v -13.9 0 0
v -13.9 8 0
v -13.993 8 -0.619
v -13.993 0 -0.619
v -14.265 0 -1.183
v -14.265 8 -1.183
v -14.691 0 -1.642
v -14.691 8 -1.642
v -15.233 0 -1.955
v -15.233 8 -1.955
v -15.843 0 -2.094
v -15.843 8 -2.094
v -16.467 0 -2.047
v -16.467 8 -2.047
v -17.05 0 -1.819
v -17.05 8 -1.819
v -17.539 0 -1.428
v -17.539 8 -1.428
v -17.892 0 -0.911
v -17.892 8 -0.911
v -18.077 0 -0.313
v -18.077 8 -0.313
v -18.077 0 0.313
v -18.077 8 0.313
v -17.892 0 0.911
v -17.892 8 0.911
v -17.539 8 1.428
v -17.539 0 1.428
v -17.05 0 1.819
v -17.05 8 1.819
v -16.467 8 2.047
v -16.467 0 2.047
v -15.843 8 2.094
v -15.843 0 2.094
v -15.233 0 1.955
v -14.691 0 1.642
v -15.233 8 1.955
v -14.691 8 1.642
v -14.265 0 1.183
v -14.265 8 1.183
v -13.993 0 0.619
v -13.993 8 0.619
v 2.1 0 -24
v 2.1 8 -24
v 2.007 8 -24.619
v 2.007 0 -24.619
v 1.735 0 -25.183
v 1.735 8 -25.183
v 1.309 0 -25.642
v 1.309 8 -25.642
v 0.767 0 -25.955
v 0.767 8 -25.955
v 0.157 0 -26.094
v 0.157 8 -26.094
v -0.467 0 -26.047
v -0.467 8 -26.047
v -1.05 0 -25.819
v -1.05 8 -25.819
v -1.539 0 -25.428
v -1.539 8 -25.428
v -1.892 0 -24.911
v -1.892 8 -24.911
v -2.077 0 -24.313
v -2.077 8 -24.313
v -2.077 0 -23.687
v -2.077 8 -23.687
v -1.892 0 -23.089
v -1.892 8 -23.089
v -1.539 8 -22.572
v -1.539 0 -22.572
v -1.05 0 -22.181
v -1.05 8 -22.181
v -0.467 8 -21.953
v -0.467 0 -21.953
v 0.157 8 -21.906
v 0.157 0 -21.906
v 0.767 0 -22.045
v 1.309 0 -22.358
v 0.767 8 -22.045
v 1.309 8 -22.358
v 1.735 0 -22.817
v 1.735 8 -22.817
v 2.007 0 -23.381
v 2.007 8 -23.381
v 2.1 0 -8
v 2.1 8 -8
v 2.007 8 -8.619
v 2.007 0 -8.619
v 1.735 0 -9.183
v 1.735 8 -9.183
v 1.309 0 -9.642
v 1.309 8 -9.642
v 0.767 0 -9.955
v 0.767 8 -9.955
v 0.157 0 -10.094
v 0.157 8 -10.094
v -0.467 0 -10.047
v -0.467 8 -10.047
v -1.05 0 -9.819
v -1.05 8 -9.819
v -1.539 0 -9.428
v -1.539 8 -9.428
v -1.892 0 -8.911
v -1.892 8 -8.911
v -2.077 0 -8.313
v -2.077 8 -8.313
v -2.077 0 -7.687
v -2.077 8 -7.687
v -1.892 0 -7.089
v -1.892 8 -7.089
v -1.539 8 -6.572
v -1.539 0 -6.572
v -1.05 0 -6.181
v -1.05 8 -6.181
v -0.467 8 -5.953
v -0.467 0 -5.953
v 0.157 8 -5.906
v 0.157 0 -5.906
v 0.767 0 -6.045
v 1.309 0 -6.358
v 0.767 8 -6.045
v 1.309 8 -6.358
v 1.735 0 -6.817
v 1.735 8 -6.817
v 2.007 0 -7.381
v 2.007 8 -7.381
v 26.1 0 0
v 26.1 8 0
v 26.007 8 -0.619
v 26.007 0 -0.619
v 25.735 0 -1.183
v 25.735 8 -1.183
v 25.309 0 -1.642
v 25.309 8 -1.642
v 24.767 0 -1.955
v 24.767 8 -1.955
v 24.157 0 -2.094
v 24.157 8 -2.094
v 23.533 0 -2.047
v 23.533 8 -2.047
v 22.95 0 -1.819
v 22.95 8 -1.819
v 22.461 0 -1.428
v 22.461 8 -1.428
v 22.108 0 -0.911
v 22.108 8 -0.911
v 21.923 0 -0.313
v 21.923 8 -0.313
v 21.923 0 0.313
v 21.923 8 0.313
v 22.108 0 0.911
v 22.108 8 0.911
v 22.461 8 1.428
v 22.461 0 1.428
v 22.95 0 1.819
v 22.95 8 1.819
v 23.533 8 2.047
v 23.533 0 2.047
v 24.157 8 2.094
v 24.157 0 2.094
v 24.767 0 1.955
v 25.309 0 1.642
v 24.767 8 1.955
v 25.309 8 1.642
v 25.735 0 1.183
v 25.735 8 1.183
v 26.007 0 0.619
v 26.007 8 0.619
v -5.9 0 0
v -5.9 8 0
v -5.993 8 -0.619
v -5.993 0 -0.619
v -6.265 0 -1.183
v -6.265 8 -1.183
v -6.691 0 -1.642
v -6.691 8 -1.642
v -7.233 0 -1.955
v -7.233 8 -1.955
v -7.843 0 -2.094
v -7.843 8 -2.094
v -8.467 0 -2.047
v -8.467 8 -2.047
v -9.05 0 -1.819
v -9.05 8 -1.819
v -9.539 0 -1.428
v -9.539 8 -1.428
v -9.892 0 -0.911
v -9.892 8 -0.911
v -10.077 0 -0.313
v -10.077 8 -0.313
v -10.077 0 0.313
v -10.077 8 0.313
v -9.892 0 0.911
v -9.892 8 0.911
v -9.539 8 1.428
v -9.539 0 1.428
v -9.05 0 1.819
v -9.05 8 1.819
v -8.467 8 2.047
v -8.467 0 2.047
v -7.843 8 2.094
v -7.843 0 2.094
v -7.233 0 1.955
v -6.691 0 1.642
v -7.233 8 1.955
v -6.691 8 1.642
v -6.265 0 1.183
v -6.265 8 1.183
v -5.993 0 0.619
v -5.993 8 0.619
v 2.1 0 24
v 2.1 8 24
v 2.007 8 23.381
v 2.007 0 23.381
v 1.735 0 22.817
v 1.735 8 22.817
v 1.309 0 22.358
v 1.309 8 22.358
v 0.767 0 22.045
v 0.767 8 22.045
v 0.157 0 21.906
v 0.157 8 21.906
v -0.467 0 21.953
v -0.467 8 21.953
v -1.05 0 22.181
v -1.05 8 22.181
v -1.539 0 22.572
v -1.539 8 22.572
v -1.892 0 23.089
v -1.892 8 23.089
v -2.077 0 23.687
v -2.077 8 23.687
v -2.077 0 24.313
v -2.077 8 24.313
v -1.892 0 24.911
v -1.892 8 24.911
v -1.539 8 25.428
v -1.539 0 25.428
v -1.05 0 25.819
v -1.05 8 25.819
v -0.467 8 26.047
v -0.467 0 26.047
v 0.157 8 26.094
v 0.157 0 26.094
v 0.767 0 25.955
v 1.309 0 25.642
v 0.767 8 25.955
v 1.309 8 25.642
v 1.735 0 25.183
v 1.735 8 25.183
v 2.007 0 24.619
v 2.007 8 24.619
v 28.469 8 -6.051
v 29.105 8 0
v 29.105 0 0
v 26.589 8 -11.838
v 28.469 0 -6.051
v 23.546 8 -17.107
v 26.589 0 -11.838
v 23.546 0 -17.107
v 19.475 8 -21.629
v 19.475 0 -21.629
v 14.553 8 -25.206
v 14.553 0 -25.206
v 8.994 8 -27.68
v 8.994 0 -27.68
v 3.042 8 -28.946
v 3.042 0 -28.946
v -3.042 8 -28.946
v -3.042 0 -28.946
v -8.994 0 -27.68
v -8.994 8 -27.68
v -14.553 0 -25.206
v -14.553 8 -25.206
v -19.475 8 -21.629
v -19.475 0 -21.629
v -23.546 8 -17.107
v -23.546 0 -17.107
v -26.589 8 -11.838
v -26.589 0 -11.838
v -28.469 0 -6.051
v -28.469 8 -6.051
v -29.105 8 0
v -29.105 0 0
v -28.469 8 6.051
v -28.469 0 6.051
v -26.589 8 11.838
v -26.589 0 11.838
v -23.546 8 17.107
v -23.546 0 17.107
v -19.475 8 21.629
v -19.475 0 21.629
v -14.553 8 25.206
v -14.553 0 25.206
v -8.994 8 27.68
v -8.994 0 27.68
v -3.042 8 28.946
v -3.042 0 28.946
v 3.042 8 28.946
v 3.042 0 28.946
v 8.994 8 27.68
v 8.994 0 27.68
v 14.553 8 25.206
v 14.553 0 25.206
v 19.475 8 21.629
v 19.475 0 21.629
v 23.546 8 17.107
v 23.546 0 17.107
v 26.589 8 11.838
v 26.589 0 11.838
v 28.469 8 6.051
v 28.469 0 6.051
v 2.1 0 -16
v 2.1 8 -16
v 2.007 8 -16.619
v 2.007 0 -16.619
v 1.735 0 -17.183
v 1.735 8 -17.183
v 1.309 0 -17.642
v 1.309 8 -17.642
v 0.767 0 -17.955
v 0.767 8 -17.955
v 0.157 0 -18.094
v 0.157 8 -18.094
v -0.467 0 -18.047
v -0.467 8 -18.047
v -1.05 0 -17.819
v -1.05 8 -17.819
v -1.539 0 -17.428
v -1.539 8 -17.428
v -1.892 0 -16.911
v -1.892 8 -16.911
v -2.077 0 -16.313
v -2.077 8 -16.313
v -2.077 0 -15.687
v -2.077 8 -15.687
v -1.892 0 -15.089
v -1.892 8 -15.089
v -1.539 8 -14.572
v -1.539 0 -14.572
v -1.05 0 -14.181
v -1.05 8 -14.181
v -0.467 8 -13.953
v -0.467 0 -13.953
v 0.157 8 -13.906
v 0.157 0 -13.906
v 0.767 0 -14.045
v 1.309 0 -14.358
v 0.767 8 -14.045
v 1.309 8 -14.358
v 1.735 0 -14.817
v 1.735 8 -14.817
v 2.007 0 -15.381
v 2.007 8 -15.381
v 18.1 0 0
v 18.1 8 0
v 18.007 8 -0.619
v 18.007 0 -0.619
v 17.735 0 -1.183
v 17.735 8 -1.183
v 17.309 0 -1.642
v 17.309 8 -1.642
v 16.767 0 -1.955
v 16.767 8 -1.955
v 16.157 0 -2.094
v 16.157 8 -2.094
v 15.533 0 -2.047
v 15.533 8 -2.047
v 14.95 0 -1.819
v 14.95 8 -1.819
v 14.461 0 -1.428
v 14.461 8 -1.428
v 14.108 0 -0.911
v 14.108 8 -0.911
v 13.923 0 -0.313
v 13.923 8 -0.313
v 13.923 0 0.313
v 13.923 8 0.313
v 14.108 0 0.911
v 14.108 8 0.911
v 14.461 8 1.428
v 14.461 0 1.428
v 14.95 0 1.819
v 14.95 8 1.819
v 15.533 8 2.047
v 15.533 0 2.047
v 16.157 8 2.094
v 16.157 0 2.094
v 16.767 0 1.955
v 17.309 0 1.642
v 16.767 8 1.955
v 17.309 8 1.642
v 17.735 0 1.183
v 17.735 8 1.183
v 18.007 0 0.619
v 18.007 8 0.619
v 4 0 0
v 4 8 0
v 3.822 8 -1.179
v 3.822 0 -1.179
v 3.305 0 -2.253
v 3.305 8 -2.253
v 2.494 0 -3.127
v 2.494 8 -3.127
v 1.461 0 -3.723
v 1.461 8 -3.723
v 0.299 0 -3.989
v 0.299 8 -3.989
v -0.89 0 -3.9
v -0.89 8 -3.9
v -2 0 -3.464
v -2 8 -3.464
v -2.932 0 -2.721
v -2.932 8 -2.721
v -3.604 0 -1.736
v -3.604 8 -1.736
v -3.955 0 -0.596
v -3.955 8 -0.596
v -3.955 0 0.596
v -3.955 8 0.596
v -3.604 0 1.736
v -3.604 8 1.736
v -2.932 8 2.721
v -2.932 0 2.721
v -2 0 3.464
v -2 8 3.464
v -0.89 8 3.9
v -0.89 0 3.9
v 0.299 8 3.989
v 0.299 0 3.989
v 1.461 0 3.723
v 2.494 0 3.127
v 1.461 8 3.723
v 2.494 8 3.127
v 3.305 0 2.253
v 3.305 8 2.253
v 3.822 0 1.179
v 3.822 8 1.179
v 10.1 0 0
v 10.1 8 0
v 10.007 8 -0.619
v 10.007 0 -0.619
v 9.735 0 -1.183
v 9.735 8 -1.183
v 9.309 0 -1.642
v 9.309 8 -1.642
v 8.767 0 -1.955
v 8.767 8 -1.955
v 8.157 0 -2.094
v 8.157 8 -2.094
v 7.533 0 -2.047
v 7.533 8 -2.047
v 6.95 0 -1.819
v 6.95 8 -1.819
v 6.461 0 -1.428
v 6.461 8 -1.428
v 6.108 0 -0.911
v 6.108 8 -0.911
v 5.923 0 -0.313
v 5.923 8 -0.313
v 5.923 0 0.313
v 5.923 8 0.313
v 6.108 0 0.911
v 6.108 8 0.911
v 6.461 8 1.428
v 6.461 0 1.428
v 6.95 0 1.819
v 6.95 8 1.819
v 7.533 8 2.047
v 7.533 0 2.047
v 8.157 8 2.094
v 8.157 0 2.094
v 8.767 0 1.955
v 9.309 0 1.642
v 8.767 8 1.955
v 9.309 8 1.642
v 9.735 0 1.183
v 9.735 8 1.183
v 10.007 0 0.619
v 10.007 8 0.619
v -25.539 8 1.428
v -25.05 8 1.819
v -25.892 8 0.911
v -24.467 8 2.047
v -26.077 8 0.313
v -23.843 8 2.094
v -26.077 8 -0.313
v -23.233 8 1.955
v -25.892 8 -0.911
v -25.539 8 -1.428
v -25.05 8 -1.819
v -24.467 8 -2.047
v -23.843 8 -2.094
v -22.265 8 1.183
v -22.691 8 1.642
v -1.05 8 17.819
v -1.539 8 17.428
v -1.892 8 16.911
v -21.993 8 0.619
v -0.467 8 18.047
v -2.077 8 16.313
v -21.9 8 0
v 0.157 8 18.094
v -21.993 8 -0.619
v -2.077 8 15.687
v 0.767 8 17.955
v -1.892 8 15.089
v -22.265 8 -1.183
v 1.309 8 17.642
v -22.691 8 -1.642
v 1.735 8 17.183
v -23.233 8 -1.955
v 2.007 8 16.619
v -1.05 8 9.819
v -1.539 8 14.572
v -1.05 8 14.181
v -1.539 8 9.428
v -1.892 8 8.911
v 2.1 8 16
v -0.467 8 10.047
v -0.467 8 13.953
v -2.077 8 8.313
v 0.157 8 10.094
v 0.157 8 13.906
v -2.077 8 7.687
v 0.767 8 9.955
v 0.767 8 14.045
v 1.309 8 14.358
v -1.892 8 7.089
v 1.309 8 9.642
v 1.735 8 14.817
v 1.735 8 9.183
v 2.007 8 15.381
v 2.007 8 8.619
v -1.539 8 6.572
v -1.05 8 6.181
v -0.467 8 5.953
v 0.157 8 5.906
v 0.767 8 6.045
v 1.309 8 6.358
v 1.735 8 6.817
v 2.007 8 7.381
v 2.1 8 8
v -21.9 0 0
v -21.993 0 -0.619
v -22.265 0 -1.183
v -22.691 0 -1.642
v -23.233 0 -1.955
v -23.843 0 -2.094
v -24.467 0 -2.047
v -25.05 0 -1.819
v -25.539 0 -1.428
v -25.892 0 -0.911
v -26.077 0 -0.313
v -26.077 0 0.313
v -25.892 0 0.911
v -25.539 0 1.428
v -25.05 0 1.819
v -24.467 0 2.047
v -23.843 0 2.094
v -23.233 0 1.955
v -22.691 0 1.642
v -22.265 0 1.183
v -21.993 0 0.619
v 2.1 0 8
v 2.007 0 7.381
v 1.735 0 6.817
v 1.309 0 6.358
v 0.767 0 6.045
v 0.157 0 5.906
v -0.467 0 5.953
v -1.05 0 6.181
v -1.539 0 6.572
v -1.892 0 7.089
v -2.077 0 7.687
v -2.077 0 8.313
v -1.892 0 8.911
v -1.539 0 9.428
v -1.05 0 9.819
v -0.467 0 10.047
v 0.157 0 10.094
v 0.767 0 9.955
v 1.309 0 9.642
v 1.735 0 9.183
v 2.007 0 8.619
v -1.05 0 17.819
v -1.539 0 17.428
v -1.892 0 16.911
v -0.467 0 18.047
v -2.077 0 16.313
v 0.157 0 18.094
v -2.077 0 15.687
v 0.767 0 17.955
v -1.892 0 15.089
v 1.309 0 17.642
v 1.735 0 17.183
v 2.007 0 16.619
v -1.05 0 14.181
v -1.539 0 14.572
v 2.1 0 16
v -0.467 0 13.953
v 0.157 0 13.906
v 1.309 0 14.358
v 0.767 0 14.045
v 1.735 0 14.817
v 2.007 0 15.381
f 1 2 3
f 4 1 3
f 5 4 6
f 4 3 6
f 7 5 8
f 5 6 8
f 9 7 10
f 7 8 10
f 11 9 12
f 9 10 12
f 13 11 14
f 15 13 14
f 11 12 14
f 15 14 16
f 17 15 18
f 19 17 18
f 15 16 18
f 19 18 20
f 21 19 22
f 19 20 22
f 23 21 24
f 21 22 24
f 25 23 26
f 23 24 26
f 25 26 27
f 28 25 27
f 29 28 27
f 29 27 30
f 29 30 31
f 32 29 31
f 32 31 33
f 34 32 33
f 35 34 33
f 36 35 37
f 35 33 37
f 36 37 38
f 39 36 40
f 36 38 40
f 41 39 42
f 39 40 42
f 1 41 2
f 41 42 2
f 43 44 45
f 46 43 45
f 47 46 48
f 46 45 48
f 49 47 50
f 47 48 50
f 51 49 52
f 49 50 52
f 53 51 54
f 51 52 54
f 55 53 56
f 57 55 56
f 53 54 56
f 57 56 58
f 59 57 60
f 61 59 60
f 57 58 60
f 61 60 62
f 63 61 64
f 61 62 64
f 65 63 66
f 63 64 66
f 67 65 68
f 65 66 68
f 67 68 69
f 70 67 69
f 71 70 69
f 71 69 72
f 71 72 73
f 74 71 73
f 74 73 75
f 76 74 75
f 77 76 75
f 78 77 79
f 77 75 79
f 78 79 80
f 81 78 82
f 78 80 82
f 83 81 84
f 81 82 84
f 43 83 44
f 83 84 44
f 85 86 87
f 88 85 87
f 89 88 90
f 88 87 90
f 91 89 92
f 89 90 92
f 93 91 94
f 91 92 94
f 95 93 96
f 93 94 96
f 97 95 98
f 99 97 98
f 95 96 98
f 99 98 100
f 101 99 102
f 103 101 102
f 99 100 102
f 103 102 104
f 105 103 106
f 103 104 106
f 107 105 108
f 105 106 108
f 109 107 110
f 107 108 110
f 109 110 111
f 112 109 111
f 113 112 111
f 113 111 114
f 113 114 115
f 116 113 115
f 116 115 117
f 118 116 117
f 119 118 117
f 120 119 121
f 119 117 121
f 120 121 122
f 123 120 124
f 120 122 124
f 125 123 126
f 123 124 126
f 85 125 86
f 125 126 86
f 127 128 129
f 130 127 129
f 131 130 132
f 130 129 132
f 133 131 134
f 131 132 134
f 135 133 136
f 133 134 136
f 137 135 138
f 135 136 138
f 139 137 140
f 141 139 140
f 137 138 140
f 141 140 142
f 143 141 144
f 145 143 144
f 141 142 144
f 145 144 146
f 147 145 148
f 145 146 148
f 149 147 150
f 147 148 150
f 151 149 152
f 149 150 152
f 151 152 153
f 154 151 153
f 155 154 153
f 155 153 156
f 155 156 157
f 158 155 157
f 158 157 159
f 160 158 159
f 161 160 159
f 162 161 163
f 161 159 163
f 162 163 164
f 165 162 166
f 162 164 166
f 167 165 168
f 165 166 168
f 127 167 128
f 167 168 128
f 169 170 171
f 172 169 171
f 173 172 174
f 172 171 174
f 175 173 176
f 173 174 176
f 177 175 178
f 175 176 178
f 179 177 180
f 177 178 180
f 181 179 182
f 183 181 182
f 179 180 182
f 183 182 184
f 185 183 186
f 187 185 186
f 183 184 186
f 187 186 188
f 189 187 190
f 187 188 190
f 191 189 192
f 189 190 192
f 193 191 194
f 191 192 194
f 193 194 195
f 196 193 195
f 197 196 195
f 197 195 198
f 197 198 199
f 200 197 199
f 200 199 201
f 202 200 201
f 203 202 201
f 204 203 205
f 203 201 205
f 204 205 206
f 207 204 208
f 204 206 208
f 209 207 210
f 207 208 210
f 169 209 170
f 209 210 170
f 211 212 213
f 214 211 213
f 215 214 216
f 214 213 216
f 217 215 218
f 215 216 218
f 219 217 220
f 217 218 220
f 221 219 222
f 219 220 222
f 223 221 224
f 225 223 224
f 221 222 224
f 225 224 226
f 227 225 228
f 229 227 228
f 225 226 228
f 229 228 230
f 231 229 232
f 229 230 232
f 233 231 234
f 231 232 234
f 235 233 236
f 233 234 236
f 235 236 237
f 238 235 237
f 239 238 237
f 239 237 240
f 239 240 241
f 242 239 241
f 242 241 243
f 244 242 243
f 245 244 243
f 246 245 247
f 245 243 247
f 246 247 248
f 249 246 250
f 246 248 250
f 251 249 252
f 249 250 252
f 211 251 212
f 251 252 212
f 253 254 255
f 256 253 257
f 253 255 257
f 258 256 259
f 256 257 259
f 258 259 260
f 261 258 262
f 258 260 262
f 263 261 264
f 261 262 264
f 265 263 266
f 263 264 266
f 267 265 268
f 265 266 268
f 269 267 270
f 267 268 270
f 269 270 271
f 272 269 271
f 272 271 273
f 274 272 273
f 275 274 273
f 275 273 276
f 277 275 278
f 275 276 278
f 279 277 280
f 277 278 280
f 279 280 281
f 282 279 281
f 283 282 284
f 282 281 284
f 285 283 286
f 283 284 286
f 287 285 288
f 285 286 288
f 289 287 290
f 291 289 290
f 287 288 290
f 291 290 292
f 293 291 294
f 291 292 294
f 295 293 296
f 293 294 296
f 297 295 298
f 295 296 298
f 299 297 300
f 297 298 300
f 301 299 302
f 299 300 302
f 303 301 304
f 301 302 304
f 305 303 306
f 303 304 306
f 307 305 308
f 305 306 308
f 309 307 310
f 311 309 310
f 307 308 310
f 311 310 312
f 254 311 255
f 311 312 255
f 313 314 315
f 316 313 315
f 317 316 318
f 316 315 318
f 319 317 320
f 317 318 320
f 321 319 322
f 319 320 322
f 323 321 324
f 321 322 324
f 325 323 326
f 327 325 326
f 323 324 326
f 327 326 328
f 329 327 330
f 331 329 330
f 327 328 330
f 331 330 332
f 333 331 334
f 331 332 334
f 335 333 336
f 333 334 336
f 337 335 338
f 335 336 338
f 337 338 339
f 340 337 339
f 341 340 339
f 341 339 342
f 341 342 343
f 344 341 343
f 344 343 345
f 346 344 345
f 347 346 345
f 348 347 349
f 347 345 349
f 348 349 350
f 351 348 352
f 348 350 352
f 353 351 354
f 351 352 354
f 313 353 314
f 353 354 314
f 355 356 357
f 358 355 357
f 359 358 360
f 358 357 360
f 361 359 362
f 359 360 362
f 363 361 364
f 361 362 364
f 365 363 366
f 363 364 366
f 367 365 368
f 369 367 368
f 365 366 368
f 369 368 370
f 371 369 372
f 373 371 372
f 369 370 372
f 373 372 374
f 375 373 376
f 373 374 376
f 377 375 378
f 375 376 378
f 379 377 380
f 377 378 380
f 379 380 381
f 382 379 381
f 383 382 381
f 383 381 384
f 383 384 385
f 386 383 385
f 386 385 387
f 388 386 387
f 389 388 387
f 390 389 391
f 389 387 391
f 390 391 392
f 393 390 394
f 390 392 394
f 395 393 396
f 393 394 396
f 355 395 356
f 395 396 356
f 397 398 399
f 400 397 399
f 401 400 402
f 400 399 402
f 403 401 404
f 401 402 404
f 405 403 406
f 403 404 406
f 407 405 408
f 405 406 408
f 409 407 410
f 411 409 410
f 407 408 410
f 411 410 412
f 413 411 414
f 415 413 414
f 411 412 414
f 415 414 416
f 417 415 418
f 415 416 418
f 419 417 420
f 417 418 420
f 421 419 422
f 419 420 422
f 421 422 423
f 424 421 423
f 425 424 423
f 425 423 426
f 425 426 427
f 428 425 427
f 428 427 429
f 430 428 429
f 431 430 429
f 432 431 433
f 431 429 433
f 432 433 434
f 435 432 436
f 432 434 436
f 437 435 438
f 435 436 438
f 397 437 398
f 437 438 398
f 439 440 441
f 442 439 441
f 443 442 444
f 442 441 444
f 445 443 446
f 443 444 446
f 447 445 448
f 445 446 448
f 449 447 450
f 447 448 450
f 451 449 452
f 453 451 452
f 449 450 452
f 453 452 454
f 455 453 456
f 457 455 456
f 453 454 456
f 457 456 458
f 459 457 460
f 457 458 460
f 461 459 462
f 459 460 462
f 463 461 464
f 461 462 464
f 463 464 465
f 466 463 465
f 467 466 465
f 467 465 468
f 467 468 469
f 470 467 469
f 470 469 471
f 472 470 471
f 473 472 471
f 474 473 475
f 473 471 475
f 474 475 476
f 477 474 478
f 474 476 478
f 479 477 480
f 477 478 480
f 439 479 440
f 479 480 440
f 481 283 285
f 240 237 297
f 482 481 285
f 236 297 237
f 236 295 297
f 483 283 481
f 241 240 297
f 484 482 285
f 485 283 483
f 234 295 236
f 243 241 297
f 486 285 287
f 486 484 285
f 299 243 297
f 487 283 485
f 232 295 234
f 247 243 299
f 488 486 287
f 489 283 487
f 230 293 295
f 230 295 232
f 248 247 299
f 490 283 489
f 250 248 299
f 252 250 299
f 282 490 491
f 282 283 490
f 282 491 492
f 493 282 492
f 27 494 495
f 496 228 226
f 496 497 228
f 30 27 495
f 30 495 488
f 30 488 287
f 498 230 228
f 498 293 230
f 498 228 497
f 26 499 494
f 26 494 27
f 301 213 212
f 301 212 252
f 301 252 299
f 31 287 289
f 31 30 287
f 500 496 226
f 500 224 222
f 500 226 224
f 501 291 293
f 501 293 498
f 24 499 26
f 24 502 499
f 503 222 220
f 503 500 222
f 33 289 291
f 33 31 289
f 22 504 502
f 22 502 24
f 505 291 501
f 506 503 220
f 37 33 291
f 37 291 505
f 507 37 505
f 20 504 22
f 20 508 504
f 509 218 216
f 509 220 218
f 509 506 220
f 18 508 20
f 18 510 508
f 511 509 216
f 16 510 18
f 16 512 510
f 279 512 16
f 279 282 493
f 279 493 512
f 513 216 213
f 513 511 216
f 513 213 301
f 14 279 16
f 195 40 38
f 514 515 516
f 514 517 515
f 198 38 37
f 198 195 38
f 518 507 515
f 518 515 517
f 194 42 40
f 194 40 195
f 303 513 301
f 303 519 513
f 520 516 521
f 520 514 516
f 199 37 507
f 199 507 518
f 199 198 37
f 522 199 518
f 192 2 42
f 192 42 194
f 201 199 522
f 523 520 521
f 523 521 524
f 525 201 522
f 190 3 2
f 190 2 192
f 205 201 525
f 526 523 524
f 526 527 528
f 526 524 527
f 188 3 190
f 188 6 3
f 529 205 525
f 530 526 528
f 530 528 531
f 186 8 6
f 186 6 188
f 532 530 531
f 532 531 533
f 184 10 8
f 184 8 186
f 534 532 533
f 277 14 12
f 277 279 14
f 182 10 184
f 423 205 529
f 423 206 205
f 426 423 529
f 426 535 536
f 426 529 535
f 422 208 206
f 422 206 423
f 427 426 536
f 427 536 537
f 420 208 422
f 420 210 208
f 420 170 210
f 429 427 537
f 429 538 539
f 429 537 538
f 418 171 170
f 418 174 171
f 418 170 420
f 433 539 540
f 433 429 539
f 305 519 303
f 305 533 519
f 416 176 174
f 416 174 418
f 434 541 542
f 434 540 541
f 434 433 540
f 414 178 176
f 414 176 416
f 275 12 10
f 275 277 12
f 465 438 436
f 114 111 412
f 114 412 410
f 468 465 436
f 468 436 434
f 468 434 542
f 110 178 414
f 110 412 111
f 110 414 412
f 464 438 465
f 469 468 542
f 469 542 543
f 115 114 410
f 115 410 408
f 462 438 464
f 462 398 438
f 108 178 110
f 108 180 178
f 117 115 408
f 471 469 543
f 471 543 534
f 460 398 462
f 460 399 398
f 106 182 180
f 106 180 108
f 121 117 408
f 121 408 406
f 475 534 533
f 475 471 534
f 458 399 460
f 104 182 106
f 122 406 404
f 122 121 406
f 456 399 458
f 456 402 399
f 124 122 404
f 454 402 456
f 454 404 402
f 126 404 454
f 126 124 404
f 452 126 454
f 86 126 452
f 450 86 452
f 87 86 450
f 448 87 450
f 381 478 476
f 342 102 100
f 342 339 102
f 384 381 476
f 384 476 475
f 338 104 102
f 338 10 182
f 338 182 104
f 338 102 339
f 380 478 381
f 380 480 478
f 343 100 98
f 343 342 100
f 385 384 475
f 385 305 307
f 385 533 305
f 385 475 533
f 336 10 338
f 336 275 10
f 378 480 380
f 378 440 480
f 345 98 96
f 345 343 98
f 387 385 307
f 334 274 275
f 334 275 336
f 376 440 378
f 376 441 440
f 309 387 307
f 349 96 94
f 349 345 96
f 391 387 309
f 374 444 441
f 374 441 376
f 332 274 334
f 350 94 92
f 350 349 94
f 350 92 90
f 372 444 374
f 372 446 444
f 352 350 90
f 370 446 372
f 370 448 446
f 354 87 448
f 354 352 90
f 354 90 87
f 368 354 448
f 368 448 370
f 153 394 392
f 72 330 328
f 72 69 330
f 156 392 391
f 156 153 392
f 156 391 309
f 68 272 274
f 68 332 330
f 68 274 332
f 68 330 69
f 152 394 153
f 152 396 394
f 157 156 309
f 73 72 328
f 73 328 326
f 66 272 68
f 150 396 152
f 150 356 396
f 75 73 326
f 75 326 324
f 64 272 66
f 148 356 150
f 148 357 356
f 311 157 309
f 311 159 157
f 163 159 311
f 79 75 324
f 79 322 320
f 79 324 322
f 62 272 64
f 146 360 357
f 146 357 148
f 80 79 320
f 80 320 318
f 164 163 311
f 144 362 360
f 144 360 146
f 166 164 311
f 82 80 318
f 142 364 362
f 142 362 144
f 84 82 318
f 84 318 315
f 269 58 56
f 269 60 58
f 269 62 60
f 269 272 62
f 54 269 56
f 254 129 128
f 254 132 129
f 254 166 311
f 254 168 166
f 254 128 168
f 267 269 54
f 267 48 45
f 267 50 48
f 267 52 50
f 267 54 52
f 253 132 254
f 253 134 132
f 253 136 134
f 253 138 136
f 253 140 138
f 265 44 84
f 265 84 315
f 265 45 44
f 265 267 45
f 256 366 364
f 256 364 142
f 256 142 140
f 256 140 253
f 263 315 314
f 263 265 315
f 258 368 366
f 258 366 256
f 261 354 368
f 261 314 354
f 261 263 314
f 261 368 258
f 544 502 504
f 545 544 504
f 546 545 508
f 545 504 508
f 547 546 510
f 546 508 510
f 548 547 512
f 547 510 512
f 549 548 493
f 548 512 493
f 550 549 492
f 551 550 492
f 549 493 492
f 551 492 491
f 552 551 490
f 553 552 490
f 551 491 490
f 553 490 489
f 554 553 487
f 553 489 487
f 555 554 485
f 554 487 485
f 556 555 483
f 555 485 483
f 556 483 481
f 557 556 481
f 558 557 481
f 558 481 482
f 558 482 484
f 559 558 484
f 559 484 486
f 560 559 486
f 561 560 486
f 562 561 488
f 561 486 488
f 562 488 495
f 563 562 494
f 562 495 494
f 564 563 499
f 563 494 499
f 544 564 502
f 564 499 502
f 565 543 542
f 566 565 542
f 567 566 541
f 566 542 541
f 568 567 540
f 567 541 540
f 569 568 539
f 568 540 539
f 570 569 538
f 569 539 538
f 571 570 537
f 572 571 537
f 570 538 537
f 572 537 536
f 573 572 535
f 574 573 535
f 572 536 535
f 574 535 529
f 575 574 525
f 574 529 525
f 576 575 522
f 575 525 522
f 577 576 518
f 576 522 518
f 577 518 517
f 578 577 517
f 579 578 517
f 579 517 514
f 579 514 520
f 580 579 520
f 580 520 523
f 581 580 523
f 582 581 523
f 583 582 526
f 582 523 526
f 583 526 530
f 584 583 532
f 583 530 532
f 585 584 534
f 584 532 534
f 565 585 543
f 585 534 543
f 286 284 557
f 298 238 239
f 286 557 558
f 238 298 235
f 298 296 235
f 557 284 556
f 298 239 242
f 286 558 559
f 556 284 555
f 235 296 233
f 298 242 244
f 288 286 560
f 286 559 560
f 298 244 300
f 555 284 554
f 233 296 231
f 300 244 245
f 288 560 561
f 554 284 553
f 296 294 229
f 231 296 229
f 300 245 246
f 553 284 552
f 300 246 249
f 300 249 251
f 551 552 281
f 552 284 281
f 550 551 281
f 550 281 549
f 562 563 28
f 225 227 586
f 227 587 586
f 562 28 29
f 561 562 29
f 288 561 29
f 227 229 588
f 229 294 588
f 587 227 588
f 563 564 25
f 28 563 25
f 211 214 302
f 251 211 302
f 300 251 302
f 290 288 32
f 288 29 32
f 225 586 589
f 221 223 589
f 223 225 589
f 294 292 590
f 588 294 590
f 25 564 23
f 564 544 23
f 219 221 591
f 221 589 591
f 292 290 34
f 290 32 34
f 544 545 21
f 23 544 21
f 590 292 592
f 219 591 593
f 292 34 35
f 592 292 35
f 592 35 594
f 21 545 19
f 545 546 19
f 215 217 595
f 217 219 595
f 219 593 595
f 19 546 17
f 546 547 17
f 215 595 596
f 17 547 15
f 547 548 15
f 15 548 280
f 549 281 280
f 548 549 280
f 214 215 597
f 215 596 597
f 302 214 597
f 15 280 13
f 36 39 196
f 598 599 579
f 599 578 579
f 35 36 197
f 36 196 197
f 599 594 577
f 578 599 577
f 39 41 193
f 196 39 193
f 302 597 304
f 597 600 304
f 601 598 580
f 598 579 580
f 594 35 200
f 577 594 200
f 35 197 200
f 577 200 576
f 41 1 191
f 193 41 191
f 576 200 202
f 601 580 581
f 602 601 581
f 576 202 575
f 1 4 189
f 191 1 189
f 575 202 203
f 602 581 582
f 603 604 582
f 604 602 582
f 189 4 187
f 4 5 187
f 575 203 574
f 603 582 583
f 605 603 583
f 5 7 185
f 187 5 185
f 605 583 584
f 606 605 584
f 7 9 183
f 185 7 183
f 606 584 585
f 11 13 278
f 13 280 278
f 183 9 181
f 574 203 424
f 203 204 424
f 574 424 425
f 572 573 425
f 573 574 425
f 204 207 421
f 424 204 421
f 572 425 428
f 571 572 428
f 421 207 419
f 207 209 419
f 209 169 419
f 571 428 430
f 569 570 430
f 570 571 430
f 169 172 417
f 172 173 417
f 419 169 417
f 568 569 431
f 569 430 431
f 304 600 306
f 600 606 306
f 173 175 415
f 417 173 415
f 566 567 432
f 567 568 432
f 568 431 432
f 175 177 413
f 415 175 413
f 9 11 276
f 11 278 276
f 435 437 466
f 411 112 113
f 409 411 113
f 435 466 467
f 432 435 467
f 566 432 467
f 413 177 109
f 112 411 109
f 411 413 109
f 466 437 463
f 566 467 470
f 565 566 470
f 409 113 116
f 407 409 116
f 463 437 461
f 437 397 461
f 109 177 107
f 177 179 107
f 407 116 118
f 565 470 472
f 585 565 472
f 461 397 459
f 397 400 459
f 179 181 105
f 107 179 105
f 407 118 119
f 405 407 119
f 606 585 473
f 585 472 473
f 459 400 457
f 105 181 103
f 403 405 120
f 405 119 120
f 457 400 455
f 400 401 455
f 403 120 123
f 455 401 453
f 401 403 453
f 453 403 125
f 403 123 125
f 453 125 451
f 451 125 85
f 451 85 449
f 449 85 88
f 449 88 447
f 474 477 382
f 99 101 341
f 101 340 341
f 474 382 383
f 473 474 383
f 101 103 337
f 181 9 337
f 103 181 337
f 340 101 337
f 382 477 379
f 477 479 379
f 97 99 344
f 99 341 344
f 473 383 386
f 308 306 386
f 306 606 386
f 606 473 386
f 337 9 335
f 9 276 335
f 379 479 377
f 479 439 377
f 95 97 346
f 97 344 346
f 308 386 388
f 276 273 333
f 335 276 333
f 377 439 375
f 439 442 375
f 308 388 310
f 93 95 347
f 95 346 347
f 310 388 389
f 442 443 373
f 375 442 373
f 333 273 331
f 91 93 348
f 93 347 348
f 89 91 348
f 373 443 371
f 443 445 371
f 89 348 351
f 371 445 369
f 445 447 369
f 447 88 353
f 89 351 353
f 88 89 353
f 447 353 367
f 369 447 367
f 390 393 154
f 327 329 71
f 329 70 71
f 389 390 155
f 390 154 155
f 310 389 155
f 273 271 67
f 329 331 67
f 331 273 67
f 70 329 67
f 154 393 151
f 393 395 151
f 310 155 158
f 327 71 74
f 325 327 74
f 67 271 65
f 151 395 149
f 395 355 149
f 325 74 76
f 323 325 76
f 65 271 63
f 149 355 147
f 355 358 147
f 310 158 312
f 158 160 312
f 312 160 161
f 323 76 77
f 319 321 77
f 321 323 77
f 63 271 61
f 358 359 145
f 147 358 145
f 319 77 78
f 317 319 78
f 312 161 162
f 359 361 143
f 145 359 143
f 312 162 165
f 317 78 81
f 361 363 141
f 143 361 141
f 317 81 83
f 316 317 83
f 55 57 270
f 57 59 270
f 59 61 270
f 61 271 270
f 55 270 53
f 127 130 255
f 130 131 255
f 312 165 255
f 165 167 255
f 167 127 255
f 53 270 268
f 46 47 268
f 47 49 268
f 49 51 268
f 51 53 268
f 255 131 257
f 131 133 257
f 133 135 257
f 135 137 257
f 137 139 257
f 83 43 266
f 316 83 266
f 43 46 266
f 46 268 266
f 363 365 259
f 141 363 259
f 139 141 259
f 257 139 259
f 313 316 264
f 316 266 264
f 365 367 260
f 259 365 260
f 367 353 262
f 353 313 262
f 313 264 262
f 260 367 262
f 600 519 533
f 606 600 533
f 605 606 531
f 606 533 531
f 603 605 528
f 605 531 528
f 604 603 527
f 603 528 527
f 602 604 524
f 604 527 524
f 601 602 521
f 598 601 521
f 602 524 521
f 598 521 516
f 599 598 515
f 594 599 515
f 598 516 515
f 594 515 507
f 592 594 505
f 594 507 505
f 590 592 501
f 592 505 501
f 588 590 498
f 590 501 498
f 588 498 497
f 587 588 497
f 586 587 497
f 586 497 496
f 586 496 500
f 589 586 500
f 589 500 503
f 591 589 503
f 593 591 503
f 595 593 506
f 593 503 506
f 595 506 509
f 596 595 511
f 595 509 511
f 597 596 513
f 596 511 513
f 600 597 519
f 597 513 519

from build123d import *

# Parameters (mm, degrees)
SKETCH_1_R          = 29.105
EXTRUDE_1_DEPTH     = 8
SKETCH_2_R          = 4
CUT_EXTRUDE_1_DEPTH = 8
SKETCH_3_R          = 2.1
CUT_EXTRUDE_2_DEPTH = 8


with BuildPart() as part:
    # 스케치1 → 보스-돌출1 (new body)
    with BuildSketch(Plane(origin=(0, 0, 0), x_dir=(1, 0, 0), z_dir=(0, 1, 0))):
        Circle(SKETCH_1_R)
    extrude(amount=EXTRUDE_1_DEPTH)

    # 스케치2 → 컷-돌출1 (cut)
    with BuildSketch(Plane(origin=(0, 8, 0), x_dir=(1, 0, 0), z_dir=(0, 1, 0))):
        Circle(SKETCH_2_R)
    extrude(amount=-CUT_EXTRUDE_1_DEPTH, mode=Mode.SUBTRACT)

    # 스케치3 → 컷-돌출2 (cut)
    with BuildSketch(Plane(origin=(0, 8, 0), x_dir=(1, 0, 0), z_dir=(0, 1, 0))):
        with Locations((0, 8)):
            Circle(SKETCH_3_R)
        with Locations((0, 16)):
            Circle(SKETCH_3_R)
        with Locations((0, 24)):
            Circle(SKETCH_3_R)
        with Locations((-8, 0)):
            Circle(SKETCH_3_R)
        with Locations((-16, 0)):
            Circle(SKETCH_3_R)
        with Locations((-24, 0)):
            Circle(SKETCH_3_R)
        with Locations((0, -8)):
            Circle(SKETCH_3_R)
        with Locations((0, -16)):
            Circle(SKETCH_3_R)
        with Locations((0, -24)):
            Circle(SKETCH_3_R)
        with Locations((8, 0)):
            Circle(SKETCH_3_R)
        with Locations((16, 0)):
            Circle(SKETCH_3_R)
        with Locations((24, 0)):
            Circle(SKETCH_3_R)
    extrude(amount=-CUT_EXTRUDE_2_DEPTH, mode=Mode.SUBTRACT)


solid = part.part
